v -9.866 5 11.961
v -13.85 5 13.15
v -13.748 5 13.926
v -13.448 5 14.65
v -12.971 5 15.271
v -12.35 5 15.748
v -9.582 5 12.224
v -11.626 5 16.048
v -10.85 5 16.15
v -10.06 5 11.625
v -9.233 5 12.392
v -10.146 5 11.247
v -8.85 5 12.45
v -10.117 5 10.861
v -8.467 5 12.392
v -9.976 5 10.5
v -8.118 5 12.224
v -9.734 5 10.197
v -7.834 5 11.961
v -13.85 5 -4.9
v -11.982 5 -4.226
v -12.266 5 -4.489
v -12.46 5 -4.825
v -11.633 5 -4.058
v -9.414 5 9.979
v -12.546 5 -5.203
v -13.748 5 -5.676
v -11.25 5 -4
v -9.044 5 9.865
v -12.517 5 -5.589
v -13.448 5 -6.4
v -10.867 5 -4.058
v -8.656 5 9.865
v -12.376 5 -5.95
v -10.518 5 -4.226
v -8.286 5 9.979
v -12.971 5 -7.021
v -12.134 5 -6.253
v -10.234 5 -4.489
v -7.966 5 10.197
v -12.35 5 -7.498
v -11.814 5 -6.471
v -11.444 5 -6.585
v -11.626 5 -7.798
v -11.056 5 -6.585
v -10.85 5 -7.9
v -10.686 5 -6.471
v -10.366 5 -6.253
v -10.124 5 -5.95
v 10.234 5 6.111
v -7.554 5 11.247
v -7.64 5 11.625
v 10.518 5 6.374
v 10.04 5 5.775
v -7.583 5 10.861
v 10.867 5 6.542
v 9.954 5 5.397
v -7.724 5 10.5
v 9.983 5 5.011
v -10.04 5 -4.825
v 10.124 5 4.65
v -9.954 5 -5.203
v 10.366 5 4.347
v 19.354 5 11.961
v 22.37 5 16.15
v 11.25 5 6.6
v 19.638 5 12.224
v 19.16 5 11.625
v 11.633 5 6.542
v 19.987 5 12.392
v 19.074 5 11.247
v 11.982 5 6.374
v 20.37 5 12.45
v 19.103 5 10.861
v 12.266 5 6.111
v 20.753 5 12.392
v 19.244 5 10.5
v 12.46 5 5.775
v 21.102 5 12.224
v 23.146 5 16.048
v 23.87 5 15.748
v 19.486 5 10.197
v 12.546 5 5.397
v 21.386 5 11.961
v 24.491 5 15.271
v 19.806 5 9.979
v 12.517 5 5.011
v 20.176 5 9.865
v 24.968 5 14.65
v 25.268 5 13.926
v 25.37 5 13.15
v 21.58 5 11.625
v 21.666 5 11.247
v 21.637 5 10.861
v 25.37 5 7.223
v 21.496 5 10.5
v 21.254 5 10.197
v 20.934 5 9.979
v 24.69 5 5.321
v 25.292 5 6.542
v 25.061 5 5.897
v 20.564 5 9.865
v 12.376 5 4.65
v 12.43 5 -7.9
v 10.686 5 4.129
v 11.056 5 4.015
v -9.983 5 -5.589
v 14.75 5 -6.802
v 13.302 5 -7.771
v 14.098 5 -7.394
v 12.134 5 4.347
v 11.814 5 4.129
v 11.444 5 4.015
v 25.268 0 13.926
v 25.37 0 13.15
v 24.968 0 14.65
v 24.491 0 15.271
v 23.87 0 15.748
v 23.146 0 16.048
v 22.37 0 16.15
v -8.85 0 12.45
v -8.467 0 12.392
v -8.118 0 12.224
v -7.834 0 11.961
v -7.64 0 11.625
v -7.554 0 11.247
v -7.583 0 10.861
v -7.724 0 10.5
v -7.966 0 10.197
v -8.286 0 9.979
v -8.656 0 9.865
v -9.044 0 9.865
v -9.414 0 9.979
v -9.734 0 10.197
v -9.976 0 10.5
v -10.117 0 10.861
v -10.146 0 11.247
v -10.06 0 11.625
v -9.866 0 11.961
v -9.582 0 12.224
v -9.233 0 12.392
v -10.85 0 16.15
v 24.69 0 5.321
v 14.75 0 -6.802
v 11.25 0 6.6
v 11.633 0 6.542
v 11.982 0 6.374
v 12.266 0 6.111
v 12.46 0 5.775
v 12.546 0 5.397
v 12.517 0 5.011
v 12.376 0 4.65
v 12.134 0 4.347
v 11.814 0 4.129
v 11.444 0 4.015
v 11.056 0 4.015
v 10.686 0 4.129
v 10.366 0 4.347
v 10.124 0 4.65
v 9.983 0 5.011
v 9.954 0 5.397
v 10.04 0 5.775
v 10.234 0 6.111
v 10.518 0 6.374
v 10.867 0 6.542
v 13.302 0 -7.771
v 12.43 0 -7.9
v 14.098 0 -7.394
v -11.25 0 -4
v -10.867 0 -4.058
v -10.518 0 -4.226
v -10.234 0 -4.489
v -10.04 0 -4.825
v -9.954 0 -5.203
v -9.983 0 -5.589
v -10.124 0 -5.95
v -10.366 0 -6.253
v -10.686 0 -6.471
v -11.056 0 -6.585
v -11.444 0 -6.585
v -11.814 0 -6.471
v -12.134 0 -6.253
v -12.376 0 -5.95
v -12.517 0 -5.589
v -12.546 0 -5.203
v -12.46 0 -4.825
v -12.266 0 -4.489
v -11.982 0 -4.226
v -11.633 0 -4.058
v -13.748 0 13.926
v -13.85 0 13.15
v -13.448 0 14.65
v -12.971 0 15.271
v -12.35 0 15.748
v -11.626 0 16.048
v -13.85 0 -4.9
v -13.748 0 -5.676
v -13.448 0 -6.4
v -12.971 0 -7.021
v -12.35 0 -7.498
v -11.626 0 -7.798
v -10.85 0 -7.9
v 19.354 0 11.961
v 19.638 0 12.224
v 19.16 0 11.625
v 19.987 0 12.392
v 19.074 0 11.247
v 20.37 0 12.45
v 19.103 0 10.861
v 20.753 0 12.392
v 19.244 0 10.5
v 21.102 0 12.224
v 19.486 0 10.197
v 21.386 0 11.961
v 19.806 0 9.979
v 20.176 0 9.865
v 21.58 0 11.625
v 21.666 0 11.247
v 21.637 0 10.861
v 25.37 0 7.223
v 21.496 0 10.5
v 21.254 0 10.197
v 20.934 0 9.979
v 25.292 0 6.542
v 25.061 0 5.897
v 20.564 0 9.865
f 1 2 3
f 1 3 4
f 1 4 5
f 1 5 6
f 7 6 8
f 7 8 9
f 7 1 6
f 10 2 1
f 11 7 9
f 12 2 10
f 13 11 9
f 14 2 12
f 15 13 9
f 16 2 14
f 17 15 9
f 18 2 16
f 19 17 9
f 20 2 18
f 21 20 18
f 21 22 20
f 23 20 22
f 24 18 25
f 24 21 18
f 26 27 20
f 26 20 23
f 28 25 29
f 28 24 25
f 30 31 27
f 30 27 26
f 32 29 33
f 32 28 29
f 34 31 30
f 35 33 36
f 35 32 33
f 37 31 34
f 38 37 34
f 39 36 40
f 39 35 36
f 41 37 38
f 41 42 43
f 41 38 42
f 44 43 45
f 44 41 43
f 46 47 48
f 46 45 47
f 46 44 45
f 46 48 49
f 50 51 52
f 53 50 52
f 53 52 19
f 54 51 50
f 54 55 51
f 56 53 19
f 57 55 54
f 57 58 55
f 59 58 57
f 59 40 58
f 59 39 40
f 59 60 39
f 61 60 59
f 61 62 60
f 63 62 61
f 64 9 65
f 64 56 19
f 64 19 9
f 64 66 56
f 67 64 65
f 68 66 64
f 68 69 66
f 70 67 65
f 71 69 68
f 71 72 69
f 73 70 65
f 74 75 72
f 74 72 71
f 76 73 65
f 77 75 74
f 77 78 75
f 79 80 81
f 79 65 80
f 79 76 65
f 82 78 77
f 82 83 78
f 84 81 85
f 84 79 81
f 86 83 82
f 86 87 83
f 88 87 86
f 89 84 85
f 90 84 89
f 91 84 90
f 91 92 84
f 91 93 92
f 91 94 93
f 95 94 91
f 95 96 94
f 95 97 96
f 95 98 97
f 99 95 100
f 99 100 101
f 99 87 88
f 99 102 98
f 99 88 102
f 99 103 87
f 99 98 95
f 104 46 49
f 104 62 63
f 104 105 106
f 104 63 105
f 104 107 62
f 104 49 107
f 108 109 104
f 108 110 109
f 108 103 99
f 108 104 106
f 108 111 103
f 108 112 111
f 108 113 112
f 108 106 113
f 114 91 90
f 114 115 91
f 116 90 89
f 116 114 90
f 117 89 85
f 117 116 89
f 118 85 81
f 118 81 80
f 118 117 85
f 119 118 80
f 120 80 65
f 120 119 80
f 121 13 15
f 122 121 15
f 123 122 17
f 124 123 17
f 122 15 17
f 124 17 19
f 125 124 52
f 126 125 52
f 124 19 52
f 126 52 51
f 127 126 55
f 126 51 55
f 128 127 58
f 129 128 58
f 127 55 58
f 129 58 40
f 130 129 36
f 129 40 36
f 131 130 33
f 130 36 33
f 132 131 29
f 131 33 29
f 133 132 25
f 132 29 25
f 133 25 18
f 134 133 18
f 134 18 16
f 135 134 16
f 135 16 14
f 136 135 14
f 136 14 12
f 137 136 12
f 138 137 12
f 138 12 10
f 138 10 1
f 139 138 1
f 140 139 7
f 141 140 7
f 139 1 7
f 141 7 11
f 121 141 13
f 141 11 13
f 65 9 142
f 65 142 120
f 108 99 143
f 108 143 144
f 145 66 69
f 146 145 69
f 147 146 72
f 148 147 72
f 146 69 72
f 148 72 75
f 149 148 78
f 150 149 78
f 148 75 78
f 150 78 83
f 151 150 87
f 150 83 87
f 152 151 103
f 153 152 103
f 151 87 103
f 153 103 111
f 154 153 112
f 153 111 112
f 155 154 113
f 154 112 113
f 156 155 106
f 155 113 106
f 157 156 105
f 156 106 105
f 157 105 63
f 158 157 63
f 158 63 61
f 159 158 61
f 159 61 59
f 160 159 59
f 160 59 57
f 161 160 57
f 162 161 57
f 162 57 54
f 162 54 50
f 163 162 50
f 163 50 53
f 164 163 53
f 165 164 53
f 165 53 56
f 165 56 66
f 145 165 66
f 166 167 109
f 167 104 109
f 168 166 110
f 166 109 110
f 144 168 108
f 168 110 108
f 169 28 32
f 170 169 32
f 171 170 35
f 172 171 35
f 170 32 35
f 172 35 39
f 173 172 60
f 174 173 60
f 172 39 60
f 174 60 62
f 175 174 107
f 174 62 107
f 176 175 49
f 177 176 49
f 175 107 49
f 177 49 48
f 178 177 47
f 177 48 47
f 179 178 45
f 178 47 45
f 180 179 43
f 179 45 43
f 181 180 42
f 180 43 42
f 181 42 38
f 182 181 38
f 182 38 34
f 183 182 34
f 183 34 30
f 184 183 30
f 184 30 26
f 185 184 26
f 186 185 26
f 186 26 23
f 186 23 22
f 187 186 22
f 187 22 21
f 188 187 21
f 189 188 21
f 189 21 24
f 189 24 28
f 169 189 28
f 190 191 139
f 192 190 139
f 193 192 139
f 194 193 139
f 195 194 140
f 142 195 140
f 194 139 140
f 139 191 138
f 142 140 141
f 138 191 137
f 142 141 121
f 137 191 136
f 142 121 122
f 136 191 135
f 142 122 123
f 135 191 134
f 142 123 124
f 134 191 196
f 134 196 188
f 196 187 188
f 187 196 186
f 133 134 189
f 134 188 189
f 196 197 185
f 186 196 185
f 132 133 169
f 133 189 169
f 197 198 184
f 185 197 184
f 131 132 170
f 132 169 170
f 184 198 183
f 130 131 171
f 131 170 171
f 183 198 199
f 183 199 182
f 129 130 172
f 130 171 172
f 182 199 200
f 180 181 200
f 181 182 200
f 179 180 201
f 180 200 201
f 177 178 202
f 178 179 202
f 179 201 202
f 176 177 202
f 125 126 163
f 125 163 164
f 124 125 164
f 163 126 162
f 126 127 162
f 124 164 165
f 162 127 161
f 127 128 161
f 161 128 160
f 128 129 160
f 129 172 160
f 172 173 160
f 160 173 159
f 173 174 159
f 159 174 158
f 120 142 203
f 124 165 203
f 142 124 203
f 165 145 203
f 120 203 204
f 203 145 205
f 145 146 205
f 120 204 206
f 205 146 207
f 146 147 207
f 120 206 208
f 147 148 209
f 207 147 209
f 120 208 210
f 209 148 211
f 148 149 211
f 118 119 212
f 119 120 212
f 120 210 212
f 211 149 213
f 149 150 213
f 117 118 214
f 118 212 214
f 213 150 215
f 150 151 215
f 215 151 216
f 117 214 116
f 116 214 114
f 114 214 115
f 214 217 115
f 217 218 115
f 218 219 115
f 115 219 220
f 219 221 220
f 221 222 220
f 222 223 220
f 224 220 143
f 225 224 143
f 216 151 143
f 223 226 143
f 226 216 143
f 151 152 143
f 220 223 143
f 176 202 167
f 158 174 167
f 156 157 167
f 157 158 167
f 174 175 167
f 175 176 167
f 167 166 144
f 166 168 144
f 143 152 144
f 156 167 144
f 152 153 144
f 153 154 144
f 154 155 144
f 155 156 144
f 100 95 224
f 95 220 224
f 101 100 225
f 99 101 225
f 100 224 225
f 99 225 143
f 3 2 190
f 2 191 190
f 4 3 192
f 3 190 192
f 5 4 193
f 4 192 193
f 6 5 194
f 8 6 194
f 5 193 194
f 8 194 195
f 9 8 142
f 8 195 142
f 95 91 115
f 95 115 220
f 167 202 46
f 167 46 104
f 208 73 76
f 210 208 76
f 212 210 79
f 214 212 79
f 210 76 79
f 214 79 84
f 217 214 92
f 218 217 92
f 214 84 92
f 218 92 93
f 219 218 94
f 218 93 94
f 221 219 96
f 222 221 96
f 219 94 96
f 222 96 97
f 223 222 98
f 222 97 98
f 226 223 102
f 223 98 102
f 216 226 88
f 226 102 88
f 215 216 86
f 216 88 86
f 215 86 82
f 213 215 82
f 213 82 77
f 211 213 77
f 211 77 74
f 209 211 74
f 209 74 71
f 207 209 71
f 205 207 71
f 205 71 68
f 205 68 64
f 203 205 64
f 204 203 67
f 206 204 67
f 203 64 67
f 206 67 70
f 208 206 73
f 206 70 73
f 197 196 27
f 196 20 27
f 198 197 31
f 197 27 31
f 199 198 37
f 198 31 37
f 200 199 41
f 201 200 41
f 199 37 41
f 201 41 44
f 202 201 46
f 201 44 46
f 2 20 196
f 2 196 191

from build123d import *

# Parameters (mm, degrees)
SKETCH_1_W          = 27.7
SKETCH_1_H          = 15.8
EXTRUDE_1_DEPTH     = 5
SKETCH_2_R          = 1.3
CUT_EXTRUDE_1_DEPTH = 17.710251345
SKETCH_3_R          = 1.3
EXTRUDE_2_DEPTH     = 5
FILLET_1_R          = 3


with BuildPart() as part:
    # ｽｹｯﾁ1 → ﾎﾞｽ - 押し出し1 (new body)
    with BuildSketch(Plane(origin=(0, 0, 0), x_dir=(1, 0, 0), z_dir=(0, 1, 0))):
        Rectangle(SKETCH_1_W, SKETCH_1_H)
    extrude(amount=EXTRUDE_1_DEPTH)

    # ｽｹｯﾁ2 → ｶｯﾄ - 押し出し1 (cut, through all)
    with BuildSketch(Plane(origin=(0, 5, 0), x_dir=(1, 0, 0), z_dir=(0, 1, 0))):
        with Locations(Location((-11.25, 5.3, 0), (0, 0, 270))):
            Circle(SKETCH_2_R)
        with Locations(Location((11.25, -5.3, 0), (0, 0, 270))):
            Circle(SKETCH_2_R)
    extrude(amount=-CUT_EXTRUDE_1_DEPTH, mode=Mode.SUBTRACT)

    # ｽｹｯﾁ3 → ﾎﾞｽ - 押し出し2 (add)
    # profile 1 of 2: a face of its own
    with BuildSketch(Plane(origin=(0, 5, 0), x_dir=(1, 0, 0), z_dir=(0, 1, 0))):
        Polygon((25.37, -6.15), (13.85, -6.15), (13.85, -7.9), (-13.85, -7.9), (-13.85, -16.15), (25.37, -16.15), align=None)
        with Locations(Location((-8.85, -11.15, 0), (0, 0, 270))):
            Circle(SKETCH_3_R, mode=Mode.SUBTRACT)
        with Locations(Location((20.37, -11.15, 0), (0, 0, 270))):
            Circle(SKETCH_3_R, mode=Mode.SUBTRACT)
    # profile 2 of 2: a face of its own
    with BuildSketch(Plane(origin=(0, 5, 0), x_dir=(1, 0, 0), z_dir=(0, 1, 0))):
        Polygon((13.85, 7.9), (13.85, -6.15), (25.37, -6.15), align=None)
    extrude(amount=-EXTRUDE_2_DEPTH)

    # ﾌｨﾚｯﾄ1
    fillet_1_edges = [part.edges().sort_by_distance(p)[0] for p in [
        (-13.85, 2.5, 16.15),
        (25.37, 2.5, 16.15),
        (25.37, 2.5, 6.15),
        (-13.85, 2.5, -7.9),
        (13.85, 2.5, -7.9),
    ]]
    fillet(fillet_1_edges, radius=FILLET_1_R)


solid = part.part
